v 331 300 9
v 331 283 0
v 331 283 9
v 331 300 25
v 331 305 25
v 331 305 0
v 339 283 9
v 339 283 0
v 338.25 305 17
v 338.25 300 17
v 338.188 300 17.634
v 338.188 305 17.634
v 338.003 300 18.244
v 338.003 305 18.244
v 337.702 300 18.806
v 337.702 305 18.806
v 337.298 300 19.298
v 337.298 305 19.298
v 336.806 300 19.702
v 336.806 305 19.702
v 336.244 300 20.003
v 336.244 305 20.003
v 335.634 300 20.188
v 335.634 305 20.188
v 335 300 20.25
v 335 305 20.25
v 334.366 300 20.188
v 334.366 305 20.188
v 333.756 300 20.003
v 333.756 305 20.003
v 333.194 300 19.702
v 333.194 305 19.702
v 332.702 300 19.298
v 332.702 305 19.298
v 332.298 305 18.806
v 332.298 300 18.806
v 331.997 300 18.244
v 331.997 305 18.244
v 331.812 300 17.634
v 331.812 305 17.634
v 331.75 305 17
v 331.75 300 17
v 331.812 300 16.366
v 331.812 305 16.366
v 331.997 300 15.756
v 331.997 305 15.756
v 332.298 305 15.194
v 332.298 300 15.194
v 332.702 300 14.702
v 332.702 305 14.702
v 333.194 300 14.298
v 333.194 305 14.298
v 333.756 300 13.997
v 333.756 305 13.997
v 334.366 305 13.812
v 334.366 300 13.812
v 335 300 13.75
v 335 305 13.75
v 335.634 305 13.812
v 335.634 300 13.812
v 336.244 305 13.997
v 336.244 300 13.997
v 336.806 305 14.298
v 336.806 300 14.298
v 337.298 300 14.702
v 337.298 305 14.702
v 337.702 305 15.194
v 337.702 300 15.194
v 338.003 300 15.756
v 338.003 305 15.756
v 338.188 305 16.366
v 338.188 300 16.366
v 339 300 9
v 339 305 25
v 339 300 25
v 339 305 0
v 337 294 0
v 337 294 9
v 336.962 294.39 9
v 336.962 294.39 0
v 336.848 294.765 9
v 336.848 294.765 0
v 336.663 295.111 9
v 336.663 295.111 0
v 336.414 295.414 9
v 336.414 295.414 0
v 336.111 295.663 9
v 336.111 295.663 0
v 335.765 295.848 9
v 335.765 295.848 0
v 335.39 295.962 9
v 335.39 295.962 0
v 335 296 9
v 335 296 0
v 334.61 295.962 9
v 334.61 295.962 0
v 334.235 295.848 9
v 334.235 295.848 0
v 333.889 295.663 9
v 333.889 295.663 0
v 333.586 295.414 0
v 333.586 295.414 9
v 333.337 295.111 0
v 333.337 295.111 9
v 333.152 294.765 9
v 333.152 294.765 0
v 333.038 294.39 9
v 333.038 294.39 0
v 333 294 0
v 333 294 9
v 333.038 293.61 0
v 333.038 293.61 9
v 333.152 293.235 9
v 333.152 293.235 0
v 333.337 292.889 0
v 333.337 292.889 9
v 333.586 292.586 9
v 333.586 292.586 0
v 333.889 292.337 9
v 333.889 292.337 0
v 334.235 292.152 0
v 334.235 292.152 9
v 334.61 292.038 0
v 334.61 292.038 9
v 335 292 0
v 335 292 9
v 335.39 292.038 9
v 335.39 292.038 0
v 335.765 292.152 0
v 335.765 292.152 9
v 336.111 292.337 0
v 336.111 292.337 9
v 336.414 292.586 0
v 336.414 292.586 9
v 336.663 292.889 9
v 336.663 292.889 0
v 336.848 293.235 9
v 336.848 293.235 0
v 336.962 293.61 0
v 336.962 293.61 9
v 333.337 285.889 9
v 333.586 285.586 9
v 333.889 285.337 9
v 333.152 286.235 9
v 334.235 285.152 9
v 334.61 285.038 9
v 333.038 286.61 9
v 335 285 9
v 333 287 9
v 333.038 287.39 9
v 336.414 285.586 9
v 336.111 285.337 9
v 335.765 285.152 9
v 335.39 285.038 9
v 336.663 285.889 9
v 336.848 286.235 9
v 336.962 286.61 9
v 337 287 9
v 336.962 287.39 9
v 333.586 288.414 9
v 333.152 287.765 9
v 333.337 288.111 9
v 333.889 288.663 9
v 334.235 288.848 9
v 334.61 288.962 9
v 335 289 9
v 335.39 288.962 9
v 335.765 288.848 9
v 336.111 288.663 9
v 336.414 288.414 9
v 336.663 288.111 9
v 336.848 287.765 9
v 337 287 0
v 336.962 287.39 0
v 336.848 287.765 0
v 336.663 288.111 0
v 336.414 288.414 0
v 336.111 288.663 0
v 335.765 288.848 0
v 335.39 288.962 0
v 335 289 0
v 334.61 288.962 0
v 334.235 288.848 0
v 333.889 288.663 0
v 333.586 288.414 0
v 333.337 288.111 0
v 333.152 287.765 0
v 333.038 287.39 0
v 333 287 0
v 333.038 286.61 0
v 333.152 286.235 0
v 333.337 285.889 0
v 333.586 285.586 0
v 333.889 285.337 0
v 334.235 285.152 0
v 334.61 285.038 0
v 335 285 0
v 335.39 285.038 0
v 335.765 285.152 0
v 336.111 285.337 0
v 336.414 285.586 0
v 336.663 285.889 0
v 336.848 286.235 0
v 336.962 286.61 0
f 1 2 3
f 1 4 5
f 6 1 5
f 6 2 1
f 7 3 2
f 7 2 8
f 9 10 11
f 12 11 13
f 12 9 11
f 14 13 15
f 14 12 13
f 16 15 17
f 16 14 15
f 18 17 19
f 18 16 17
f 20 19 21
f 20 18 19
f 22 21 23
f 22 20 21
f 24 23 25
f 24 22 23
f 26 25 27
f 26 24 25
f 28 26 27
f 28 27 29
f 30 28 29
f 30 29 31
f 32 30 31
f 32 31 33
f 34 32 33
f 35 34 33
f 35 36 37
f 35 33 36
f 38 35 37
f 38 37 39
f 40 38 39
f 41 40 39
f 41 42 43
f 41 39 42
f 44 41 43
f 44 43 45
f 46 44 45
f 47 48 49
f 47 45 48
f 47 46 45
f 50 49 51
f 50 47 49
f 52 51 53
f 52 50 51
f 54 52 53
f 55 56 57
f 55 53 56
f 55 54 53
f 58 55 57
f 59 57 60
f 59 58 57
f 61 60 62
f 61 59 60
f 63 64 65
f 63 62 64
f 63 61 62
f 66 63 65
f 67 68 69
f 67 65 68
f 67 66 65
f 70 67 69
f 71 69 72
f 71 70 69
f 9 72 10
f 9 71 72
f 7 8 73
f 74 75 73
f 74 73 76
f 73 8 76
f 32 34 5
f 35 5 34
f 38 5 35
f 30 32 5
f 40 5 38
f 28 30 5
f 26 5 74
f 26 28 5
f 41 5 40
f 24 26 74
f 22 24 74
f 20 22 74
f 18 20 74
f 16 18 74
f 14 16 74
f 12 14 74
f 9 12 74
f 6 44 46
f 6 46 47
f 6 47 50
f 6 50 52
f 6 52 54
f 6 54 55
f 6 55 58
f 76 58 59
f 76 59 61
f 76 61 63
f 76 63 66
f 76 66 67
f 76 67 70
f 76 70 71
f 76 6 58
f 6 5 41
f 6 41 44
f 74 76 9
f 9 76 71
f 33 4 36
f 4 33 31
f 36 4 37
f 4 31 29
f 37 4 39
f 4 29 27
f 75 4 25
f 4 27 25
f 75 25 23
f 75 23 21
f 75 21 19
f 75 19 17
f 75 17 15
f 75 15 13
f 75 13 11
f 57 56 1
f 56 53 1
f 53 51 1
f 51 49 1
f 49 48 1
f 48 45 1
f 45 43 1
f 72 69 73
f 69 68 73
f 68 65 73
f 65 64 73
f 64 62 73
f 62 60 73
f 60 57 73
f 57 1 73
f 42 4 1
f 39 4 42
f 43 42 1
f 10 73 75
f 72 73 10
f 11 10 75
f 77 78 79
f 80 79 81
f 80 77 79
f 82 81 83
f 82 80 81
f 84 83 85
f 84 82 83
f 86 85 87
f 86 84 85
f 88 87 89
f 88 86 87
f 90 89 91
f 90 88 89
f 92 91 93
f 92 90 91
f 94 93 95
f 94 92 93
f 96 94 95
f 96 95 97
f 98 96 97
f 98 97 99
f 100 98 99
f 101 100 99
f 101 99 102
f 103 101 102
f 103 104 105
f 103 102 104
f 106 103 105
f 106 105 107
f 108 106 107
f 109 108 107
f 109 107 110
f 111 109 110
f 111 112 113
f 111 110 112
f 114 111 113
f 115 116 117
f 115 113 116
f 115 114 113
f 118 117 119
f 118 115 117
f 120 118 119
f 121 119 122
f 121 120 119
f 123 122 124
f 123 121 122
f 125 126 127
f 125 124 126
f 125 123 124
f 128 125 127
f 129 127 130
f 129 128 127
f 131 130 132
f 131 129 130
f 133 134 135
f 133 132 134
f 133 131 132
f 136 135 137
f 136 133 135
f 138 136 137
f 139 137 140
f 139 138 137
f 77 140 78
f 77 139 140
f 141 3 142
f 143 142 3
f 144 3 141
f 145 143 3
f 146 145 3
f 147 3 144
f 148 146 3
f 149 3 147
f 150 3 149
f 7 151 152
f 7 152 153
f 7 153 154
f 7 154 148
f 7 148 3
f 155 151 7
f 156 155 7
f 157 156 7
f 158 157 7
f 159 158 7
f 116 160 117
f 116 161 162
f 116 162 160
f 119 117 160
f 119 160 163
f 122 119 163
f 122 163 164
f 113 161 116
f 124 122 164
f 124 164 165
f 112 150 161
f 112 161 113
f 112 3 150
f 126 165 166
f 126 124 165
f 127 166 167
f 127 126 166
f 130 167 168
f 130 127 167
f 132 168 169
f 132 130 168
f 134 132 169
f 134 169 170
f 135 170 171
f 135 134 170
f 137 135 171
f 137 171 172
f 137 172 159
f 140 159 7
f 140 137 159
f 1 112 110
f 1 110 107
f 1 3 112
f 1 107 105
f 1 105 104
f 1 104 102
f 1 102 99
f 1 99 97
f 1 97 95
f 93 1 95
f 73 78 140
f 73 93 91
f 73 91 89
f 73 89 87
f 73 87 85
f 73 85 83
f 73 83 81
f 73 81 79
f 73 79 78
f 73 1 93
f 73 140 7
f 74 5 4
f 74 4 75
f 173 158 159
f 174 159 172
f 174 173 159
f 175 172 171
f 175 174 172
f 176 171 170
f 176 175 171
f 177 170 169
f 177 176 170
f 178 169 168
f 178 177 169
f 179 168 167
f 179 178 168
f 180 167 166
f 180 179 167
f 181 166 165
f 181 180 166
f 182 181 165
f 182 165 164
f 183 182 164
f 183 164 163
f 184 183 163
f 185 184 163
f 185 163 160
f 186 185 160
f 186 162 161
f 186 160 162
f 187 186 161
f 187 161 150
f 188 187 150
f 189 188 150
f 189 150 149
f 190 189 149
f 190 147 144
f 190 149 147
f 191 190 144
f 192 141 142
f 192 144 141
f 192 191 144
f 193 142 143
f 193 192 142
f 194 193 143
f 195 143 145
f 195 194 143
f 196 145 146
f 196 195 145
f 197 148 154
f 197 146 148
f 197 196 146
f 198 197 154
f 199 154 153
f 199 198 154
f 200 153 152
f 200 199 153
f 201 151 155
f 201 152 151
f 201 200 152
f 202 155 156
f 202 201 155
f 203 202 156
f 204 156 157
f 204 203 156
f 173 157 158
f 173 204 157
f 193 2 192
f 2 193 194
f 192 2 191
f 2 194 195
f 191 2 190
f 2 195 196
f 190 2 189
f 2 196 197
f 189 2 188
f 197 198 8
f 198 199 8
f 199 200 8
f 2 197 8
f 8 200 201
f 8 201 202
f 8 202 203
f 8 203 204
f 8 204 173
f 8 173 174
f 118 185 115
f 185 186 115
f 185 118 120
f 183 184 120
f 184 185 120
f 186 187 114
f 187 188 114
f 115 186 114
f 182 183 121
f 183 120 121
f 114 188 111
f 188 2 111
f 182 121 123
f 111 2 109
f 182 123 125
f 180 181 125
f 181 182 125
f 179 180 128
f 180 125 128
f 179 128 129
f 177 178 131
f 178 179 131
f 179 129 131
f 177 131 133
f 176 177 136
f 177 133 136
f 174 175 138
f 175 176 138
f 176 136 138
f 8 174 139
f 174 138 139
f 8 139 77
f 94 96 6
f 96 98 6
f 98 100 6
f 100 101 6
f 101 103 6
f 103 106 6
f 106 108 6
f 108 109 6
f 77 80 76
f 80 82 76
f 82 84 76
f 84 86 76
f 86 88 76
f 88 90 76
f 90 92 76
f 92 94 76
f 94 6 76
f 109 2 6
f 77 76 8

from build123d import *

# Parameters (mm, degrees)
CYLINDER084_R     = 2
CYLINDER084_DEPTH = 10
CYLINDER083_R     = 3.25
CYLINDER083_DEPTH = 10
CYLINDER082_R     = 2
CYLINDER082_DEPTH = 10
BOX069_W          = 8.5
BOX069_H          = 22
BOX069_DEPTH      = 25
BOX068_W          = 8
BOX068_H          = 22
BOX068_DEPTH      = 25


with BuildPart() as cylinder084:
    # Cylinder084 → Cylinder084 (new body)
    with BuildSketch(Plane(origin=(335, 287, 0), x_dir=(1, 0, 0), z_dir=(0, 0, 1))):
        Circle(CYLINDER084_R)
    extrude(amount=CYLINDER084_DEPTH)


with BuildPart() as cylinder083:
    # Cylinder083 → Cylinder083 (new body)
    with BuildSketch(Plane(origin=(335, 305, 17), x_dir=(1, 0, 0), z_dir=(0, -1, 0))):
        Circle(CYLINDER083_R)
    extrude(amount=CYLINDER083_DEPTH)


with BuildPart() as fusion049:
    # Cylinder082 → Cylinder082 (new body)
    with BuildSketch(Plane(origin=(335, 294, 0), x_dir=(1, 0, 0), z_dir=(0, 0, 1))):
        Circle(CYLINDER082_R)
    extrude(amount=CYLINDER082_DEPTH)

    # Fusion049: union Cylinder083
    add(cylinder083.part)


with BuildPart() as cube020:
    # Box069 → Box069 (new body)
    with BuildSketch(Plane(origin=(331, 278, 9), x_dir=(1, 0, 0), z_dir=(0, 0, 1))):
        with Locations((4.25, 11)):
            Rectangle(BOX069_W, BOX069_H)
    extrude(amount=BOX069_DEPTH)


with BuildPart() as antennaholder:
    # Box068 → Box068 (new body)
    with BuildSketch(Plane(origin=(331, 283, 0), x_dir=(1, 0, 0), z_dir=(0, 0, 1))):
        with Locations((4, 11)):
            Rectangle(BOX068_W, BOX068_H)
    extrude(amount=BOX068_DEPTH)

    # Cut061: cut Cube020
    add(cube020.part, mode=Mode.SUBTRACT)

    # Cut062: cut Fusion049
    add(fusion049.part, mode=Mode.SUBTRACT)

    # Cut063: cut Cylinder084
    add(cylinder084.part, mode=Mode.SUBTRACT)


solid = antennaholder.part
